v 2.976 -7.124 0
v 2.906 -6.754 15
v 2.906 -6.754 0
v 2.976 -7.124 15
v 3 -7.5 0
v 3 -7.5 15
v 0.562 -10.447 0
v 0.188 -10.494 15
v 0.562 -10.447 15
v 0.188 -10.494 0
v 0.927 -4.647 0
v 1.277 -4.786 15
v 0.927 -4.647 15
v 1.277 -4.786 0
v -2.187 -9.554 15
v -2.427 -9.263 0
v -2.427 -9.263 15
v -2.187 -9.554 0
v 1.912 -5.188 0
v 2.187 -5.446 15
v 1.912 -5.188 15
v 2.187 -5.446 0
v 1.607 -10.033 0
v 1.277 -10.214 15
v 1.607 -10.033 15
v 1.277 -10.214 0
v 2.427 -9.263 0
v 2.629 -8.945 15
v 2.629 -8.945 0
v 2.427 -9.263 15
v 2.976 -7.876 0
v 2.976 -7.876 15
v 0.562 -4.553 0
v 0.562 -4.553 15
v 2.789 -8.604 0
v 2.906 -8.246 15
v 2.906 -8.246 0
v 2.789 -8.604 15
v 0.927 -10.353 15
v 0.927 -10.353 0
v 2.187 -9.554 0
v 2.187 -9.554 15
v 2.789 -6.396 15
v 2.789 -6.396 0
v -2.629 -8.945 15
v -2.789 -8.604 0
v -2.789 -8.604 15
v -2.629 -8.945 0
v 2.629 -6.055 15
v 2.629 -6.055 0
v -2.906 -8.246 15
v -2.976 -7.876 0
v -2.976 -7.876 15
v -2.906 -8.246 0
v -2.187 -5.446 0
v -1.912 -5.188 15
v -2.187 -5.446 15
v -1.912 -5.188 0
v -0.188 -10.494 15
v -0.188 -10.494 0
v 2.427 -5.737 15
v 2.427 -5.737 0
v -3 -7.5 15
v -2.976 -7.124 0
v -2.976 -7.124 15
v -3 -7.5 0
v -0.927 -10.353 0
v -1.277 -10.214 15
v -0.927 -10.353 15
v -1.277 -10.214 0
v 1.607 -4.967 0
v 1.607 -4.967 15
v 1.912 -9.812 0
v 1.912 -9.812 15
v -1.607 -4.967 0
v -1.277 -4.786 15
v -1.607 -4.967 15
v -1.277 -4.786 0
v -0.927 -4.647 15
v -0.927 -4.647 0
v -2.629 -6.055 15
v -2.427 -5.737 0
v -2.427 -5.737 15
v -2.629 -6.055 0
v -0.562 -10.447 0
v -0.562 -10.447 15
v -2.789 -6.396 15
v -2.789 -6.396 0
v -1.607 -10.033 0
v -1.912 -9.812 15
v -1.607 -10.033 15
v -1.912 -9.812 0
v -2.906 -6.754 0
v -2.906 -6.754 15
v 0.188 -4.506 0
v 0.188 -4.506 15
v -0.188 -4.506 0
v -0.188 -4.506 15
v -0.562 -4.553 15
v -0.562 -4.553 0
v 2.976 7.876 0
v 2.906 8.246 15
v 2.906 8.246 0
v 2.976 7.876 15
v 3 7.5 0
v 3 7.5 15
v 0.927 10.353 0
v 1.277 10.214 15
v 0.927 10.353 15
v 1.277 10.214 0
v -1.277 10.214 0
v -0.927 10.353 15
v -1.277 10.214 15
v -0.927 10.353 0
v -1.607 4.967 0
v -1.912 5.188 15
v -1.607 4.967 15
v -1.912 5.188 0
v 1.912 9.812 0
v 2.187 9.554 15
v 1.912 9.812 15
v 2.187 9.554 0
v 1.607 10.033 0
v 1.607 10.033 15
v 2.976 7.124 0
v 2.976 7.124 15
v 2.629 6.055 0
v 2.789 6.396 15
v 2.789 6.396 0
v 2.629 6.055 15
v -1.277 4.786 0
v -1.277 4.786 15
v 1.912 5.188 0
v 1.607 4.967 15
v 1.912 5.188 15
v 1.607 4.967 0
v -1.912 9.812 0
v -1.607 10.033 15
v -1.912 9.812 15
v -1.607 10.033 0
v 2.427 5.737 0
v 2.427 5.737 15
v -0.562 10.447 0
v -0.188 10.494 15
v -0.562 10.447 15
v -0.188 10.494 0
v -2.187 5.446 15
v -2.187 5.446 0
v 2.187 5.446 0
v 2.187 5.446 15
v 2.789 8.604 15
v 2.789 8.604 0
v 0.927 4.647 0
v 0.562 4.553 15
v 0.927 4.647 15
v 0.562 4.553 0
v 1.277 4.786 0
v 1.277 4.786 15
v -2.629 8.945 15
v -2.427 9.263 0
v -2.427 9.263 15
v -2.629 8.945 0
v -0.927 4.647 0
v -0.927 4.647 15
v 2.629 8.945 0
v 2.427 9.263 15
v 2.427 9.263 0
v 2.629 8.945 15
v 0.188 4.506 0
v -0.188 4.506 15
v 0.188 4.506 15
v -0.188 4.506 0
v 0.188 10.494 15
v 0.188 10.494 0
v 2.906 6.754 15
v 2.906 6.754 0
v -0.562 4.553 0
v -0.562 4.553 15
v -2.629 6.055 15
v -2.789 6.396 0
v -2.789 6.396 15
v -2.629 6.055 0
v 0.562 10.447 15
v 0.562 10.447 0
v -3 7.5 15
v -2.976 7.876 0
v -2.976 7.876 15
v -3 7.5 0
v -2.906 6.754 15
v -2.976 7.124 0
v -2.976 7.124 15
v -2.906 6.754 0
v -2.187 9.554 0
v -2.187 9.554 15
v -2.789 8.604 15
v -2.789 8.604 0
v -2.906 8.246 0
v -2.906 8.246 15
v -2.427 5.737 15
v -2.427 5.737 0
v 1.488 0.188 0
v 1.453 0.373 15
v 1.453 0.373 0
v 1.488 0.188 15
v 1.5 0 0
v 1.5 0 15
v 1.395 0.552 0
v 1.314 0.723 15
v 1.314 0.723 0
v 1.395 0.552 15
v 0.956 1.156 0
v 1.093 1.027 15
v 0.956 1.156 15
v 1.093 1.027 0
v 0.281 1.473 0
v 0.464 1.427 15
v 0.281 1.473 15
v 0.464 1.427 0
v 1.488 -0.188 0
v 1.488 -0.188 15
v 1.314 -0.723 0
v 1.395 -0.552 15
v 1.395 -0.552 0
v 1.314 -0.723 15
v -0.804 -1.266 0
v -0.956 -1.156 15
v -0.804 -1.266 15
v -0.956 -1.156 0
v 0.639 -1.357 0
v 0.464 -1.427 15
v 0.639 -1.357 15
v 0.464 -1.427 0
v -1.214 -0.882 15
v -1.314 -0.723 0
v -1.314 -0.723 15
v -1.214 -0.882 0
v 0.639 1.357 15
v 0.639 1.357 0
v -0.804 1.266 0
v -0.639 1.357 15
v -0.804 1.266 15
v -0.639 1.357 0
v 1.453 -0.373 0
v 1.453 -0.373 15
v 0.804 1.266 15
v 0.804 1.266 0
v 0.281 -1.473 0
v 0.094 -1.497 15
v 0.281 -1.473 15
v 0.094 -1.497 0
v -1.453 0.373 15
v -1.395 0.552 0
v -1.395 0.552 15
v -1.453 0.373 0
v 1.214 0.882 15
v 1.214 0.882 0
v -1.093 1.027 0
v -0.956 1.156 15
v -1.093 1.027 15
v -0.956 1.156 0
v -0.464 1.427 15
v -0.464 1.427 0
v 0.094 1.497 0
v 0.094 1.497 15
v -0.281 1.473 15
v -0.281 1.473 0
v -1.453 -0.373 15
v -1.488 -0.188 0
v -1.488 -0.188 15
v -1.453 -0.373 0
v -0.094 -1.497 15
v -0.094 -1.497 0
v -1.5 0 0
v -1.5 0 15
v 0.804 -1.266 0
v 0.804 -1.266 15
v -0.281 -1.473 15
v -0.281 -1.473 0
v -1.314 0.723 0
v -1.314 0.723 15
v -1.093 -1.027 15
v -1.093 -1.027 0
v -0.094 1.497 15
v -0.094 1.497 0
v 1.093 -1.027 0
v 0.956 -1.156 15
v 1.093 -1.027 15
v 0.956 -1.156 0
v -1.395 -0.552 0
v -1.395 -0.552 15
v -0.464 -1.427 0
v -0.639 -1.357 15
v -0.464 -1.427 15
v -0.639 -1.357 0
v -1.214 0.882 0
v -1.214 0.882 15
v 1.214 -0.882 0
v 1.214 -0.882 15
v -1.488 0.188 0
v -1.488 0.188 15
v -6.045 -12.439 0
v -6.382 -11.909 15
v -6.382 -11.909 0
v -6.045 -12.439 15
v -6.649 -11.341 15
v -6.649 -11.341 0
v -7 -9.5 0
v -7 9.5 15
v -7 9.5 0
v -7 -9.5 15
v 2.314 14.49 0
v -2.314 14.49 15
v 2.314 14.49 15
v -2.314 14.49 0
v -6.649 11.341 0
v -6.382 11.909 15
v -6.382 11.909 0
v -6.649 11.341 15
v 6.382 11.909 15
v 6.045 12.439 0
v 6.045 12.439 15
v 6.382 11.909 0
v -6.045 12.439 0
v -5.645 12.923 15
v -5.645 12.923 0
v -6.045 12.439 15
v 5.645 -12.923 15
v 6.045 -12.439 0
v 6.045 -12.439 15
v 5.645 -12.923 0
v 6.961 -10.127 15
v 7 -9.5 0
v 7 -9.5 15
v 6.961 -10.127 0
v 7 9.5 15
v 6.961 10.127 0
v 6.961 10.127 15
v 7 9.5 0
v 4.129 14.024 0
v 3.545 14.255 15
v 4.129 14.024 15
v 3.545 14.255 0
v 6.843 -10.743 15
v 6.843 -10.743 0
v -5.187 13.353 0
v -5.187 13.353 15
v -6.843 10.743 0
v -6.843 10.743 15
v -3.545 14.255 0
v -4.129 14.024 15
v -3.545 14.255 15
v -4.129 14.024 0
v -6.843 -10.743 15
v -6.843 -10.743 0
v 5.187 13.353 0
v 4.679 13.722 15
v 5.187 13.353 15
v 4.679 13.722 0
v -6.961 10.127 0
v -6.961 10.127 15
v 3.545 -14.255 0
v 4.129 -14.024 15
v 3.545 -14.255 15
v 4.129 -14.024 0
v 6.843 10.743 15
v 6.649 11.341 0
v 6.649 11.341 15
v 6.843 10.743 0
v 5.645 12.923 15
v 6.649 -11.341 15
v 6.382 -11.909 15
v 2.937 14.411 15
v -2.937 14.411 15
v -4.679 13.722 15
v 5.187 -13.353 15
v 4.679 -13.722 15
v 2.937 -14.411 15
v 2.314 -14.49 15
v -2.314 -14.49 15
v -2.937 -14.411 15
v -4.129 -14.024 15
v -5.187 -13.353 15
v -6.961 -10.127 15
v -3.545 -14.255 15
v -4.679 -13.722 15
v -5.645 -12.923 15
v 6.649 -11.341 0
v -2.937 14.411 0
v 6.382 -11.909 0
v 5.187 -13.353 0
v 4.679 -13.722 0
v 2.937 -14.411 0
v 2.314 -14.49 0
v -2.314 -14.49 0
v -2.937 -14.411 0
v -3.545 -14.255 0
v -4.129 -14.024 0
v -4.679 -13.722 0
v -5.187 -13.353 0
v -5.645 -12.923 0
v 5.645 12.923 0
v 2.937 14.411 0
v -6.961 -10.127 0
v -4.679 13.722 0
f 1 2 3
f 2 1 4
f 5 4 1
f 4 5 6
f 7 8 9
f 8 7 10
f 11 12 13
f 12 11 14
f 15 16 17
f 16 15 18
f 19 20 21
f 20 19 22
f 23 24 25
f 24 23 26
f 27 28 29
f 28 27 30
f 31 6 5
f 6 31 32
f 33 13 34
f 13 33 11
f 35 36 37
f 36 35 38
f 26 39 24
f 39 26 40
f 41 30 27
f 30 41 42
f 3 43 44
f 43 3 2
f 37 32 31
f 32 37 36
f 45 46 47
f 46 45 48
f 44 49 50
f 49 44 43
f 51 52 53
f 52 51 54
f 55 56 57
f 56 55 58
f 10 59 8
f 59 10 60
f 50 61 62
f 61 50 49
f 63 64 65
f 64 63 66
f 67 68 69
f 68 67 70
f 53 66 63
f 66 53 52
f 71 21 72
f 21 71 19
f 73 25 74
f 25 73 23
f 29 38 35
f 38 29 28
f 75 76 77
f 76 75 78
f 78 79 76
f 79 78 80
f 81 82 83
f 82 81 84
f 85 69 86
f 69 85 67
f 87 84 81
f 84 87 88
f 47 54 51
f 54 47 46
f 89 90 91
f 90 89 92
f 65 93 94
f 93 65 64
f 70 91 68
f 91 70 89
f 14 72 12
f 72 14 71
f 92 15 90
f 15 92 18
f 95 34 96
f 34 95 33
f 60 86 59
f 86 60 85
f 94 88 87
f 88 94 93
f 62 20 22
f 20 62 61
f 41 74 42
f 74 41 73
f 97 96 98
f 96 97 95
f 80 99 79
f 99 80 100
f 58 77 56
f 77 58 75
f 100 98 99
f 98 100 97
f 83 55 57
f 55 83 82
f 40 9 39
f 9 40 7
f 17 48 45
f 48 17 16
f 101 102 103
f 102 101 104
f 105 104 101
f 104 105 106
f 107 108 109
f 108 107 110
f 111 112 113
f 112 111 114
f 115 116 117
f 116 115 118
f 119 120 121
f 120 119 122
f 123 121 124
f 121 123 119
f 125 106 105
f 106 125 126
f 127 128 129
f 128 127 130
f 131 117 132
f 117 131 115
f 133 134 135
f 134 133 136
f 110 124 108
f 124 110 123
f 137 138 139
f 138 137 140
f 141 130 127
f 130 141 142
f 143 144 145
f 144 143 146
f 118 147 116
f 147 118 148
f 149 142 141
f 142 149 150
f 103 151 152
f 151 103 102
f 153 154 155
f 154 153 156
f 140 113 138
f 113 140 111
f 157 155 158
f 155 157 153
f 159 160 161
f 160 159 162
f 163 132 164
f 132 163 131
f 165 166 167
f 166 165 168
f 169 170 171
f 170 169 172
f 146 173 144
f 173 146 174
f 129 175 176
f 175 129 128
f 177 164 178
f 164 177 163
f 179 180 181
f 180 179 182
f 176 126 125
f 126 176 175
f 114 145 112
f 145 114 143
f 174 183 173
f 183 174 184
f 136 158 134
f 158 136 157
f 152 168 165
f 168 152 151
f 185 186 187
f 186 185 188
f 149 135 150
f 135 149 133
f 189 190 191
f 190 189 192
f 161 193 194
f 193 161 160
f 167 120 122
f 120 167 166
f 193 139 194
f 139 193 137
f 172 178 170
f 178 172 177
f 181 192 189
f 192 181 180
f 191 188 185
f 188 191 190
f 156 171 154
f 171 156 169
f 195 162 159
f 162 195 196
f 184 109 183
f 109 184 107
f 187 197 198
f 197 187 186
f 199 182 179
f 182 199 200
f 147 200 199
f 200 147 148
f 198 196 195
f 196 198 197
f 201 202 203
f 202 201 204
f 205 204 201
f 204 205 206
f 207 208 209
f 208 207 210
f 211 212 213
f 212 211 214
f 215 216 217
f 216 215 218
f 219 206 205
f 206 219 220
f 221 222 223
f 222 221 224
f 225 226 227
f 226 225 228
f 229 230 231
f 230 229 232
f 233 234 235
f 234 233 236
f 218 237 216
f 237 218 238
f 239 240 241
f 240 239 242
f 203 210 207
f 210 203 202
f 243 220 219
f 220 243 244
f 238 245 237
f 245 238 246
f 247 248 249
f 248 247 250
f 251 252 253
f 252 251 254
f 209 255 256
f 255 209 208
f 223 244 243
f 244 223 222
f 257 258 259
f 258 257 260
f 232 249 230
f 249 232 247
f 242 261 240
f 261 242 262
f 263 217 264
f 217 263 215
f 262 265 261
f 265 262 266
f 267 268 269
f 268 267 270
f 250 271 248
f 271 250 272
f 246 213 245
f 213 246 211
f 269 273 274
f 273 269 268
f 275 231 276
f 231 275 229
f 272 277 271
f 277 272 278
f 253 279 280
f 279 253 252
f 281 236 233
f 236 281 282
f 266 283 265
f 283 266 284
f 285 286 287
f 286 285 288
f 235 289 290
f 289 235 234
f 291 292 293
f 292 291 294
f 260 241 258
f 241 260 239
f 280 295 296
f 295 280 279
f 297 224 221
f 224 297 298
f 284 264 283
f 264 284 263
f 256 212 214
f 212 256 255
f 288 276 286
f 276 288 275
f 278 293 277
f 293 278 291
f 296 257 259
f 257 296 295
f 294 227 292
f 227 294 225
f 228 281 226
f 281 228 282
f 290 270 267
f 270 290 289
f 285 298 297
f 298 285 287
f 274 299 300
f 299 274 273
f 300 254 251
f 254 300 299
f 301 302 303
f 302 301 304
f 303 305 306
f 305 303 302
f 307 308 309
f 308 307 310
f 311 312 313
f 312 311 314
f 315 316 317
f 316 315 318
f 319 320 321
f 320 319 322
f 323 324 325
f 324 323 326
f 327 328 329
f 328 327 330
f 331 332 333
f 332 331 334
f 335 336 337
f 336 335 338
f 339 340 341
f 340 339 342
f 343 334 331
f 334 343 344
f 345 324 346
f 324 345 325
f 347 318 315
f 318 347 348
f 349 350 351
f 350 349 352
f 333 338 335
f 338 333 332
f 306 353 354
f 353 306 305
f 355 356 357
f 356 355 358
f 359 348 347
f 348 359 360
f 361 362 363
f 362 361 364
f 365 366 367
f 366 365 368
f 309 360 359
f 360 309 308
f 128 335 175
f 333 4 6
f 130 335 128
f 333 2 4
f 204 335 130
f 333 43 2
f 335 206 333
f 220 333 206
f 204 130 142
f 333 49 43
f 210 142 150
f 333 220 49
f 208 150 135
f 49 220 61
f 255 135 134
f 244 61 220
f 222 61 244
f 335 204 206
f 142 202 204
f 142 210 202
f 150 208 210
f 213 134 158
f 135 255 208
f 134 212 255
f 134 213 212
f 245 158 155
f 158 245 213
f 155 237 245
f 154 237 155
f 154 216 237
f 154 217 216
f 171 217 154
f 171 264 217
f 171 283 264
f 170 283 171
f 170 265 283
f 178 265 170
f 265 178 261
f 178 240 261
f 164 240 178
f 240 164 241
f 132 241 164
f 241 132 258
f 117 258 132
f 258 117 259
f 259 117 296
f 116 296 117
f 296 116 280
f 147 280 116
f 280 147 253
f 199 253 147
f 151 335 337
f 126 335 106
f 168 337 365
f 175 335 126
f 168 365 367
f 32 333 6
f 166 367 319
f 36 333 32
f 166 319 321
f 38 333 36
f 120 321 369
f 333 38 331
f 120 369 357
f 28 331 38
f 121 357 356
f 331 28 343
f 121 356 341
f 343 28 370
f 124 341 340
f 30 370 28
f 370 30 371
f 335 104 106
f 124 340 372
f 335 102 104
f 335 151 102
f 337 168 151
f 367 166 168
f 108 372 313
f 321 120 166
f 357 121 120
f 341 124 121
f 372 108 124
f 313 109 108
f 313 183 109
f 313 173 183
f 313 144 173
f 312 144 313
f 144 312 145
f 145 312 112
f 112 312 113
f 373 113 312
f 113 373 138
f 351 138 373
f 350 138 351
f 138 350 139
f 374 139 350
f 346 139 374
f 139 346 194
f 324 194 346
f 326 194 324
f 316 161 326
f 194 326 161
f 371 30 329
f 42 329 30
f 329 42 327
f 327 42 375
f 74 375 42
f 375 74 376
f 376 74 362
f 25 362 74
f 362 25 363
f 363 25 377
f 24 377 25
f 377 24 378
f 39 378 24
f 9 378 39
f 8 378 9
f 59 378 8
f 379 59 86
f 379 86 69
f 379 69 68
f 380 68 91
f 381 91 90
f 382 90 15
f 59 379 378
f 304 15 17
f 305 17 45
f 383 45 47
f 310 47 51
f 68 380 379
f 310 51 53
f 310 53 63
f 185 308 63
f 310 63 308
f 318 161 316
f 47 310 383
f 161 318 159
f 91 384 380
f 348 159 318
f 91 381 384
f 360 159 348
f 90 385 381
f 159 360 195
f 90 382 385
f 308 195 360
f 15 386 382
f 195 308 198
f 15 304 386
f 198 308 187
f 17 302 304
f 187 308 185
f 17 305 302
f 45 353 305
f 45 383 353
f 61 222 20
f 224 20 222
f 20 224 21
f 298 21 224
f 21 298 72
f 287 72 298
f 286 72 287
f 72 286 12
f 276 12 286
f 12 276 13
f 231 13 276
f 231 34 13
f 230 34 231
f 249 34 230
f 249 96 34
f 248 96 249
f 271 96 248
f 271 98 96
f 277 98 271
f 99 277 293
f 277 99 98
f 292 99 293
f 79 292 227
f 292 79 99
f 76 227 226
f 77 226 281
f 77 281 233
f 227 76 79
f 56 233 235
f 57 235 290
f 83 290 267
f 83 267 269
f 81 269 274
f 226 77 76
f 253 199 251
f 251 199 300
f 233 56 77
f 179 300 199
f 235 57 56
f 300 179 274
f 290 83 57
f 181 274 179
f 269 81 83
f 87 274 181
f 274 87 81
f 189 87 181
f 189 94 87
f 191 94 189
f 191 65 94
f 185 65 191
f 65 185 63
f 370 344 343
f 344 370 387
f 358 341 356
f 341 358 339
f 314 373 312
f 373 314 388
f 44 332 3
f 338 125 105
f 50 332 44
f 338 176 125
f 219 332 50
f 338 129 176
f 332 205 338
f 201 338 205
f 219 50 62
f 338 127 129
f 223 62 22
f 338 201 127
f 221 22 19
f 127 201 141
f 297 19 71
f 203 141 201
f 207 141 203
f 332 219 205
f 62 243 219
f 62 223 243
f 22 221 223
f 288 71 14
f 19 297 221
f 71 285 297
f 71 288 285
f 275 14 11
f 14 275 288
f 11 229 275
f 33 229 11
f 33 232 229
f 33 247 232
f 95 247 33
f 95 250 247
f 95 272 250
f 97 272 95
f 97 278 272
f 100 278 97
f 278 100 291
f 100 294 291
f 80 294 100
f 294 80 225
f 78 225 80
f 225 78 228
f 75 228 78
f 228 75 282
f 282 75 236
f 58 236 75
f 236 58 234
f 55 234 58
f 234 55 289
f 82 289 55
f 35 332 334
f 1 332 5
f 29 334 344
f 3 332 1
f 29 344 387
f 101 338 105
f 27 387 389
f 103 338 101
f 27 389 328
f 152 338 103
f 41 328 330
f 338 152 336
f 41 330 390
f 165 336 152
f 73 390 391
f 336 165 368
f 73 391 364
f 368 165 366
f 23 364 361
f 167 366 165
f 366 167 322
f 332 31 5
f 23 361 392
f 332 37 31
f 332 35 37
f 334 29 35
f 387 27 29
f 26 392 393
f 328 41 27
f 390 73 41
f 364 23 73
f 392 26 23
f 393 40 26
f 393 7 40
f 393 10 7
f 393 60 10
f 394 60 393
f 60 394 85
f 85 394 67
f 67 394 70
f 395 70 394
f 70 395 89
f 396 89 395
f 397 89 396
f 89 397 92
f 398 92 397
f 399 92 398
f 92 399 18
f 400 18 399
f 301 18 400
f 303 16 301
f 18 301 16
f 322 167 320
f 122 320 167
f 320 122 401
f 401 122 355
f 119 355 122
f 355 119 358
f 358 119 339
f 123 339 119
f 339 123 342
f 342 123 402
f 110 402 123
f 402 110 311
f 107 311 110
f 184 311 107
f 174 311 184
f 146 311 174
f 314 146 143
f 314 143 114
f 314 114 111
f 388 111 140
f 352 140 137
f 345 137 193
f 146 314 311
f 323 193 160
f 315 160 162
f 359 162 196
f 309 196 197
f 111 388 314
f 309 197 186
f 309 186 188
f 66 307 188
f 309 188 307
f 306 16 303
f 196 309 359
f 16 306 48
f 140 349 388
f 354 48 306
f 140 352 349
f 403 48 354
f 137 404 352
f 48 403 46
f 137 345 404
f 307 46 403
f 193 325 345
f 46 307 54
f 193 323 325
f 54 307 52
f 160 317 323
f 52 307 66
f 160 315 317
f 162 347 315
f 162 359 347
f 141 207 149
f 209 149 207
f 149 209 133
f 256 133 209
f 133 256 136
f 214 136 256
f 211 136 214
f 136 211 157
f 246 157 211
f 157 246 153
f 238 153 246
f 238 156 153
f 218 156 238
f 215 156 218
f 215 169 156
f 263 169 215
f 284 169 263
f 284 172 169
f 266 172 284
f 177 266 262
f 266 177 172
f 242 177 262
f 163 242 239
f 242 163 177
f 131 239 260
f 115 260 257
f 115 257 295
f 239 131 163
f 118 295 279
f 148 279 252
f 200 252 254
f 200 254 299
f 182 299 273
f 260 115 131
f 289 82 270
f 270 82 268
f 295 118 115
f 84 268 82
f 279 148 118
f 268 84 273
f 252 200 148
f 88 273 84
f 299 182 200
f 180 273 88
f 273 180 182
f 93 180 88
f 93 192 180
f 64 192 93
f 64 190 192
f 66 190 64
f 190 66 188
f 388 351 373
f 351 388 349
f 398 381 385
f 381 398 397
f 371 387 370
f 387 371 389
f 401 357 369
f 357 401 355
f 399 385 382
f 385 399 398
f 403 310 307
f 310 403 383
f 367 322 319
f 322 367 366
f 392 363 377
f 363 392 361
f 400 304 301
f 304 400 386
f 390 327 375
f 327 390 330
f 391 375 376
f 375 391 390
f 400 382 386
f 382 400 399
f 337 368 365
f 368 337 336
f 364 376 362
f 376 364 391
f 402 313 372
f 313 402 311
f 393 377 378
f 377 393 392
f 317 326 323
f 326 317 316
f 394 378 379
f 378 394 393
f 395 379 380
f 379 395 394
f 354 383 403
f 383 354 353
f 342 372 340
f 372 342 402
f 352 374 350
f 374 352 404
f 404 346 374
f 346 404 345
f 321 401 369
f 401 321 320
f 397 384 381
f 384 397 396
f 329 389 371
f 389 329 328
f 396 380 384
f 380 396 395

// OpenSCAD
$fn = 50;

difference() {
	union() {
		hull() {
			translate(v = [-2.0, 9.5, 0]) {
				cylinder(h = 15, r = 5);
			}
			translate(v = [2.0, 9.5, 0]) {
				cylinder(h = 15, r = 5);
			}
			translate(v = [-2.0, -9.5, 0]) {
				cylinder(h = 15, r = 5);
			}
			translate(v = [2.0, -9.5, 0]) {
				cylinder(h = 15, r = 5);
			}
		}
	}
	union() {
		translate(v = [0.0, -7.5, 0]) {
			translate(v = [0, 0, -100]) {
				cylinder(h = 200, r = 3.0);
			}
		}
		translate(v = [0.0, 7.5, 0]) {
			translate(v = [0, 0, -100]) {
				cylinder(h = 200, r = 3.0);
			}
		}
		translate(v = [0.0, -7.5, 0]) {
			translate(v = [0, 0, -100]) {
				cylinder(h = 200, r = 1.5);
			}
		}
		translate(v = [0, 0, -100]) {
			cylinder(h = 200, r = 1.5);
		}
		translate(v = [0.0, 7.5, 0]) {
			translate(v = [0, 0, -100]) {
				cylinder(h = 200, r = 1.5);
			}
		}
	}
}
